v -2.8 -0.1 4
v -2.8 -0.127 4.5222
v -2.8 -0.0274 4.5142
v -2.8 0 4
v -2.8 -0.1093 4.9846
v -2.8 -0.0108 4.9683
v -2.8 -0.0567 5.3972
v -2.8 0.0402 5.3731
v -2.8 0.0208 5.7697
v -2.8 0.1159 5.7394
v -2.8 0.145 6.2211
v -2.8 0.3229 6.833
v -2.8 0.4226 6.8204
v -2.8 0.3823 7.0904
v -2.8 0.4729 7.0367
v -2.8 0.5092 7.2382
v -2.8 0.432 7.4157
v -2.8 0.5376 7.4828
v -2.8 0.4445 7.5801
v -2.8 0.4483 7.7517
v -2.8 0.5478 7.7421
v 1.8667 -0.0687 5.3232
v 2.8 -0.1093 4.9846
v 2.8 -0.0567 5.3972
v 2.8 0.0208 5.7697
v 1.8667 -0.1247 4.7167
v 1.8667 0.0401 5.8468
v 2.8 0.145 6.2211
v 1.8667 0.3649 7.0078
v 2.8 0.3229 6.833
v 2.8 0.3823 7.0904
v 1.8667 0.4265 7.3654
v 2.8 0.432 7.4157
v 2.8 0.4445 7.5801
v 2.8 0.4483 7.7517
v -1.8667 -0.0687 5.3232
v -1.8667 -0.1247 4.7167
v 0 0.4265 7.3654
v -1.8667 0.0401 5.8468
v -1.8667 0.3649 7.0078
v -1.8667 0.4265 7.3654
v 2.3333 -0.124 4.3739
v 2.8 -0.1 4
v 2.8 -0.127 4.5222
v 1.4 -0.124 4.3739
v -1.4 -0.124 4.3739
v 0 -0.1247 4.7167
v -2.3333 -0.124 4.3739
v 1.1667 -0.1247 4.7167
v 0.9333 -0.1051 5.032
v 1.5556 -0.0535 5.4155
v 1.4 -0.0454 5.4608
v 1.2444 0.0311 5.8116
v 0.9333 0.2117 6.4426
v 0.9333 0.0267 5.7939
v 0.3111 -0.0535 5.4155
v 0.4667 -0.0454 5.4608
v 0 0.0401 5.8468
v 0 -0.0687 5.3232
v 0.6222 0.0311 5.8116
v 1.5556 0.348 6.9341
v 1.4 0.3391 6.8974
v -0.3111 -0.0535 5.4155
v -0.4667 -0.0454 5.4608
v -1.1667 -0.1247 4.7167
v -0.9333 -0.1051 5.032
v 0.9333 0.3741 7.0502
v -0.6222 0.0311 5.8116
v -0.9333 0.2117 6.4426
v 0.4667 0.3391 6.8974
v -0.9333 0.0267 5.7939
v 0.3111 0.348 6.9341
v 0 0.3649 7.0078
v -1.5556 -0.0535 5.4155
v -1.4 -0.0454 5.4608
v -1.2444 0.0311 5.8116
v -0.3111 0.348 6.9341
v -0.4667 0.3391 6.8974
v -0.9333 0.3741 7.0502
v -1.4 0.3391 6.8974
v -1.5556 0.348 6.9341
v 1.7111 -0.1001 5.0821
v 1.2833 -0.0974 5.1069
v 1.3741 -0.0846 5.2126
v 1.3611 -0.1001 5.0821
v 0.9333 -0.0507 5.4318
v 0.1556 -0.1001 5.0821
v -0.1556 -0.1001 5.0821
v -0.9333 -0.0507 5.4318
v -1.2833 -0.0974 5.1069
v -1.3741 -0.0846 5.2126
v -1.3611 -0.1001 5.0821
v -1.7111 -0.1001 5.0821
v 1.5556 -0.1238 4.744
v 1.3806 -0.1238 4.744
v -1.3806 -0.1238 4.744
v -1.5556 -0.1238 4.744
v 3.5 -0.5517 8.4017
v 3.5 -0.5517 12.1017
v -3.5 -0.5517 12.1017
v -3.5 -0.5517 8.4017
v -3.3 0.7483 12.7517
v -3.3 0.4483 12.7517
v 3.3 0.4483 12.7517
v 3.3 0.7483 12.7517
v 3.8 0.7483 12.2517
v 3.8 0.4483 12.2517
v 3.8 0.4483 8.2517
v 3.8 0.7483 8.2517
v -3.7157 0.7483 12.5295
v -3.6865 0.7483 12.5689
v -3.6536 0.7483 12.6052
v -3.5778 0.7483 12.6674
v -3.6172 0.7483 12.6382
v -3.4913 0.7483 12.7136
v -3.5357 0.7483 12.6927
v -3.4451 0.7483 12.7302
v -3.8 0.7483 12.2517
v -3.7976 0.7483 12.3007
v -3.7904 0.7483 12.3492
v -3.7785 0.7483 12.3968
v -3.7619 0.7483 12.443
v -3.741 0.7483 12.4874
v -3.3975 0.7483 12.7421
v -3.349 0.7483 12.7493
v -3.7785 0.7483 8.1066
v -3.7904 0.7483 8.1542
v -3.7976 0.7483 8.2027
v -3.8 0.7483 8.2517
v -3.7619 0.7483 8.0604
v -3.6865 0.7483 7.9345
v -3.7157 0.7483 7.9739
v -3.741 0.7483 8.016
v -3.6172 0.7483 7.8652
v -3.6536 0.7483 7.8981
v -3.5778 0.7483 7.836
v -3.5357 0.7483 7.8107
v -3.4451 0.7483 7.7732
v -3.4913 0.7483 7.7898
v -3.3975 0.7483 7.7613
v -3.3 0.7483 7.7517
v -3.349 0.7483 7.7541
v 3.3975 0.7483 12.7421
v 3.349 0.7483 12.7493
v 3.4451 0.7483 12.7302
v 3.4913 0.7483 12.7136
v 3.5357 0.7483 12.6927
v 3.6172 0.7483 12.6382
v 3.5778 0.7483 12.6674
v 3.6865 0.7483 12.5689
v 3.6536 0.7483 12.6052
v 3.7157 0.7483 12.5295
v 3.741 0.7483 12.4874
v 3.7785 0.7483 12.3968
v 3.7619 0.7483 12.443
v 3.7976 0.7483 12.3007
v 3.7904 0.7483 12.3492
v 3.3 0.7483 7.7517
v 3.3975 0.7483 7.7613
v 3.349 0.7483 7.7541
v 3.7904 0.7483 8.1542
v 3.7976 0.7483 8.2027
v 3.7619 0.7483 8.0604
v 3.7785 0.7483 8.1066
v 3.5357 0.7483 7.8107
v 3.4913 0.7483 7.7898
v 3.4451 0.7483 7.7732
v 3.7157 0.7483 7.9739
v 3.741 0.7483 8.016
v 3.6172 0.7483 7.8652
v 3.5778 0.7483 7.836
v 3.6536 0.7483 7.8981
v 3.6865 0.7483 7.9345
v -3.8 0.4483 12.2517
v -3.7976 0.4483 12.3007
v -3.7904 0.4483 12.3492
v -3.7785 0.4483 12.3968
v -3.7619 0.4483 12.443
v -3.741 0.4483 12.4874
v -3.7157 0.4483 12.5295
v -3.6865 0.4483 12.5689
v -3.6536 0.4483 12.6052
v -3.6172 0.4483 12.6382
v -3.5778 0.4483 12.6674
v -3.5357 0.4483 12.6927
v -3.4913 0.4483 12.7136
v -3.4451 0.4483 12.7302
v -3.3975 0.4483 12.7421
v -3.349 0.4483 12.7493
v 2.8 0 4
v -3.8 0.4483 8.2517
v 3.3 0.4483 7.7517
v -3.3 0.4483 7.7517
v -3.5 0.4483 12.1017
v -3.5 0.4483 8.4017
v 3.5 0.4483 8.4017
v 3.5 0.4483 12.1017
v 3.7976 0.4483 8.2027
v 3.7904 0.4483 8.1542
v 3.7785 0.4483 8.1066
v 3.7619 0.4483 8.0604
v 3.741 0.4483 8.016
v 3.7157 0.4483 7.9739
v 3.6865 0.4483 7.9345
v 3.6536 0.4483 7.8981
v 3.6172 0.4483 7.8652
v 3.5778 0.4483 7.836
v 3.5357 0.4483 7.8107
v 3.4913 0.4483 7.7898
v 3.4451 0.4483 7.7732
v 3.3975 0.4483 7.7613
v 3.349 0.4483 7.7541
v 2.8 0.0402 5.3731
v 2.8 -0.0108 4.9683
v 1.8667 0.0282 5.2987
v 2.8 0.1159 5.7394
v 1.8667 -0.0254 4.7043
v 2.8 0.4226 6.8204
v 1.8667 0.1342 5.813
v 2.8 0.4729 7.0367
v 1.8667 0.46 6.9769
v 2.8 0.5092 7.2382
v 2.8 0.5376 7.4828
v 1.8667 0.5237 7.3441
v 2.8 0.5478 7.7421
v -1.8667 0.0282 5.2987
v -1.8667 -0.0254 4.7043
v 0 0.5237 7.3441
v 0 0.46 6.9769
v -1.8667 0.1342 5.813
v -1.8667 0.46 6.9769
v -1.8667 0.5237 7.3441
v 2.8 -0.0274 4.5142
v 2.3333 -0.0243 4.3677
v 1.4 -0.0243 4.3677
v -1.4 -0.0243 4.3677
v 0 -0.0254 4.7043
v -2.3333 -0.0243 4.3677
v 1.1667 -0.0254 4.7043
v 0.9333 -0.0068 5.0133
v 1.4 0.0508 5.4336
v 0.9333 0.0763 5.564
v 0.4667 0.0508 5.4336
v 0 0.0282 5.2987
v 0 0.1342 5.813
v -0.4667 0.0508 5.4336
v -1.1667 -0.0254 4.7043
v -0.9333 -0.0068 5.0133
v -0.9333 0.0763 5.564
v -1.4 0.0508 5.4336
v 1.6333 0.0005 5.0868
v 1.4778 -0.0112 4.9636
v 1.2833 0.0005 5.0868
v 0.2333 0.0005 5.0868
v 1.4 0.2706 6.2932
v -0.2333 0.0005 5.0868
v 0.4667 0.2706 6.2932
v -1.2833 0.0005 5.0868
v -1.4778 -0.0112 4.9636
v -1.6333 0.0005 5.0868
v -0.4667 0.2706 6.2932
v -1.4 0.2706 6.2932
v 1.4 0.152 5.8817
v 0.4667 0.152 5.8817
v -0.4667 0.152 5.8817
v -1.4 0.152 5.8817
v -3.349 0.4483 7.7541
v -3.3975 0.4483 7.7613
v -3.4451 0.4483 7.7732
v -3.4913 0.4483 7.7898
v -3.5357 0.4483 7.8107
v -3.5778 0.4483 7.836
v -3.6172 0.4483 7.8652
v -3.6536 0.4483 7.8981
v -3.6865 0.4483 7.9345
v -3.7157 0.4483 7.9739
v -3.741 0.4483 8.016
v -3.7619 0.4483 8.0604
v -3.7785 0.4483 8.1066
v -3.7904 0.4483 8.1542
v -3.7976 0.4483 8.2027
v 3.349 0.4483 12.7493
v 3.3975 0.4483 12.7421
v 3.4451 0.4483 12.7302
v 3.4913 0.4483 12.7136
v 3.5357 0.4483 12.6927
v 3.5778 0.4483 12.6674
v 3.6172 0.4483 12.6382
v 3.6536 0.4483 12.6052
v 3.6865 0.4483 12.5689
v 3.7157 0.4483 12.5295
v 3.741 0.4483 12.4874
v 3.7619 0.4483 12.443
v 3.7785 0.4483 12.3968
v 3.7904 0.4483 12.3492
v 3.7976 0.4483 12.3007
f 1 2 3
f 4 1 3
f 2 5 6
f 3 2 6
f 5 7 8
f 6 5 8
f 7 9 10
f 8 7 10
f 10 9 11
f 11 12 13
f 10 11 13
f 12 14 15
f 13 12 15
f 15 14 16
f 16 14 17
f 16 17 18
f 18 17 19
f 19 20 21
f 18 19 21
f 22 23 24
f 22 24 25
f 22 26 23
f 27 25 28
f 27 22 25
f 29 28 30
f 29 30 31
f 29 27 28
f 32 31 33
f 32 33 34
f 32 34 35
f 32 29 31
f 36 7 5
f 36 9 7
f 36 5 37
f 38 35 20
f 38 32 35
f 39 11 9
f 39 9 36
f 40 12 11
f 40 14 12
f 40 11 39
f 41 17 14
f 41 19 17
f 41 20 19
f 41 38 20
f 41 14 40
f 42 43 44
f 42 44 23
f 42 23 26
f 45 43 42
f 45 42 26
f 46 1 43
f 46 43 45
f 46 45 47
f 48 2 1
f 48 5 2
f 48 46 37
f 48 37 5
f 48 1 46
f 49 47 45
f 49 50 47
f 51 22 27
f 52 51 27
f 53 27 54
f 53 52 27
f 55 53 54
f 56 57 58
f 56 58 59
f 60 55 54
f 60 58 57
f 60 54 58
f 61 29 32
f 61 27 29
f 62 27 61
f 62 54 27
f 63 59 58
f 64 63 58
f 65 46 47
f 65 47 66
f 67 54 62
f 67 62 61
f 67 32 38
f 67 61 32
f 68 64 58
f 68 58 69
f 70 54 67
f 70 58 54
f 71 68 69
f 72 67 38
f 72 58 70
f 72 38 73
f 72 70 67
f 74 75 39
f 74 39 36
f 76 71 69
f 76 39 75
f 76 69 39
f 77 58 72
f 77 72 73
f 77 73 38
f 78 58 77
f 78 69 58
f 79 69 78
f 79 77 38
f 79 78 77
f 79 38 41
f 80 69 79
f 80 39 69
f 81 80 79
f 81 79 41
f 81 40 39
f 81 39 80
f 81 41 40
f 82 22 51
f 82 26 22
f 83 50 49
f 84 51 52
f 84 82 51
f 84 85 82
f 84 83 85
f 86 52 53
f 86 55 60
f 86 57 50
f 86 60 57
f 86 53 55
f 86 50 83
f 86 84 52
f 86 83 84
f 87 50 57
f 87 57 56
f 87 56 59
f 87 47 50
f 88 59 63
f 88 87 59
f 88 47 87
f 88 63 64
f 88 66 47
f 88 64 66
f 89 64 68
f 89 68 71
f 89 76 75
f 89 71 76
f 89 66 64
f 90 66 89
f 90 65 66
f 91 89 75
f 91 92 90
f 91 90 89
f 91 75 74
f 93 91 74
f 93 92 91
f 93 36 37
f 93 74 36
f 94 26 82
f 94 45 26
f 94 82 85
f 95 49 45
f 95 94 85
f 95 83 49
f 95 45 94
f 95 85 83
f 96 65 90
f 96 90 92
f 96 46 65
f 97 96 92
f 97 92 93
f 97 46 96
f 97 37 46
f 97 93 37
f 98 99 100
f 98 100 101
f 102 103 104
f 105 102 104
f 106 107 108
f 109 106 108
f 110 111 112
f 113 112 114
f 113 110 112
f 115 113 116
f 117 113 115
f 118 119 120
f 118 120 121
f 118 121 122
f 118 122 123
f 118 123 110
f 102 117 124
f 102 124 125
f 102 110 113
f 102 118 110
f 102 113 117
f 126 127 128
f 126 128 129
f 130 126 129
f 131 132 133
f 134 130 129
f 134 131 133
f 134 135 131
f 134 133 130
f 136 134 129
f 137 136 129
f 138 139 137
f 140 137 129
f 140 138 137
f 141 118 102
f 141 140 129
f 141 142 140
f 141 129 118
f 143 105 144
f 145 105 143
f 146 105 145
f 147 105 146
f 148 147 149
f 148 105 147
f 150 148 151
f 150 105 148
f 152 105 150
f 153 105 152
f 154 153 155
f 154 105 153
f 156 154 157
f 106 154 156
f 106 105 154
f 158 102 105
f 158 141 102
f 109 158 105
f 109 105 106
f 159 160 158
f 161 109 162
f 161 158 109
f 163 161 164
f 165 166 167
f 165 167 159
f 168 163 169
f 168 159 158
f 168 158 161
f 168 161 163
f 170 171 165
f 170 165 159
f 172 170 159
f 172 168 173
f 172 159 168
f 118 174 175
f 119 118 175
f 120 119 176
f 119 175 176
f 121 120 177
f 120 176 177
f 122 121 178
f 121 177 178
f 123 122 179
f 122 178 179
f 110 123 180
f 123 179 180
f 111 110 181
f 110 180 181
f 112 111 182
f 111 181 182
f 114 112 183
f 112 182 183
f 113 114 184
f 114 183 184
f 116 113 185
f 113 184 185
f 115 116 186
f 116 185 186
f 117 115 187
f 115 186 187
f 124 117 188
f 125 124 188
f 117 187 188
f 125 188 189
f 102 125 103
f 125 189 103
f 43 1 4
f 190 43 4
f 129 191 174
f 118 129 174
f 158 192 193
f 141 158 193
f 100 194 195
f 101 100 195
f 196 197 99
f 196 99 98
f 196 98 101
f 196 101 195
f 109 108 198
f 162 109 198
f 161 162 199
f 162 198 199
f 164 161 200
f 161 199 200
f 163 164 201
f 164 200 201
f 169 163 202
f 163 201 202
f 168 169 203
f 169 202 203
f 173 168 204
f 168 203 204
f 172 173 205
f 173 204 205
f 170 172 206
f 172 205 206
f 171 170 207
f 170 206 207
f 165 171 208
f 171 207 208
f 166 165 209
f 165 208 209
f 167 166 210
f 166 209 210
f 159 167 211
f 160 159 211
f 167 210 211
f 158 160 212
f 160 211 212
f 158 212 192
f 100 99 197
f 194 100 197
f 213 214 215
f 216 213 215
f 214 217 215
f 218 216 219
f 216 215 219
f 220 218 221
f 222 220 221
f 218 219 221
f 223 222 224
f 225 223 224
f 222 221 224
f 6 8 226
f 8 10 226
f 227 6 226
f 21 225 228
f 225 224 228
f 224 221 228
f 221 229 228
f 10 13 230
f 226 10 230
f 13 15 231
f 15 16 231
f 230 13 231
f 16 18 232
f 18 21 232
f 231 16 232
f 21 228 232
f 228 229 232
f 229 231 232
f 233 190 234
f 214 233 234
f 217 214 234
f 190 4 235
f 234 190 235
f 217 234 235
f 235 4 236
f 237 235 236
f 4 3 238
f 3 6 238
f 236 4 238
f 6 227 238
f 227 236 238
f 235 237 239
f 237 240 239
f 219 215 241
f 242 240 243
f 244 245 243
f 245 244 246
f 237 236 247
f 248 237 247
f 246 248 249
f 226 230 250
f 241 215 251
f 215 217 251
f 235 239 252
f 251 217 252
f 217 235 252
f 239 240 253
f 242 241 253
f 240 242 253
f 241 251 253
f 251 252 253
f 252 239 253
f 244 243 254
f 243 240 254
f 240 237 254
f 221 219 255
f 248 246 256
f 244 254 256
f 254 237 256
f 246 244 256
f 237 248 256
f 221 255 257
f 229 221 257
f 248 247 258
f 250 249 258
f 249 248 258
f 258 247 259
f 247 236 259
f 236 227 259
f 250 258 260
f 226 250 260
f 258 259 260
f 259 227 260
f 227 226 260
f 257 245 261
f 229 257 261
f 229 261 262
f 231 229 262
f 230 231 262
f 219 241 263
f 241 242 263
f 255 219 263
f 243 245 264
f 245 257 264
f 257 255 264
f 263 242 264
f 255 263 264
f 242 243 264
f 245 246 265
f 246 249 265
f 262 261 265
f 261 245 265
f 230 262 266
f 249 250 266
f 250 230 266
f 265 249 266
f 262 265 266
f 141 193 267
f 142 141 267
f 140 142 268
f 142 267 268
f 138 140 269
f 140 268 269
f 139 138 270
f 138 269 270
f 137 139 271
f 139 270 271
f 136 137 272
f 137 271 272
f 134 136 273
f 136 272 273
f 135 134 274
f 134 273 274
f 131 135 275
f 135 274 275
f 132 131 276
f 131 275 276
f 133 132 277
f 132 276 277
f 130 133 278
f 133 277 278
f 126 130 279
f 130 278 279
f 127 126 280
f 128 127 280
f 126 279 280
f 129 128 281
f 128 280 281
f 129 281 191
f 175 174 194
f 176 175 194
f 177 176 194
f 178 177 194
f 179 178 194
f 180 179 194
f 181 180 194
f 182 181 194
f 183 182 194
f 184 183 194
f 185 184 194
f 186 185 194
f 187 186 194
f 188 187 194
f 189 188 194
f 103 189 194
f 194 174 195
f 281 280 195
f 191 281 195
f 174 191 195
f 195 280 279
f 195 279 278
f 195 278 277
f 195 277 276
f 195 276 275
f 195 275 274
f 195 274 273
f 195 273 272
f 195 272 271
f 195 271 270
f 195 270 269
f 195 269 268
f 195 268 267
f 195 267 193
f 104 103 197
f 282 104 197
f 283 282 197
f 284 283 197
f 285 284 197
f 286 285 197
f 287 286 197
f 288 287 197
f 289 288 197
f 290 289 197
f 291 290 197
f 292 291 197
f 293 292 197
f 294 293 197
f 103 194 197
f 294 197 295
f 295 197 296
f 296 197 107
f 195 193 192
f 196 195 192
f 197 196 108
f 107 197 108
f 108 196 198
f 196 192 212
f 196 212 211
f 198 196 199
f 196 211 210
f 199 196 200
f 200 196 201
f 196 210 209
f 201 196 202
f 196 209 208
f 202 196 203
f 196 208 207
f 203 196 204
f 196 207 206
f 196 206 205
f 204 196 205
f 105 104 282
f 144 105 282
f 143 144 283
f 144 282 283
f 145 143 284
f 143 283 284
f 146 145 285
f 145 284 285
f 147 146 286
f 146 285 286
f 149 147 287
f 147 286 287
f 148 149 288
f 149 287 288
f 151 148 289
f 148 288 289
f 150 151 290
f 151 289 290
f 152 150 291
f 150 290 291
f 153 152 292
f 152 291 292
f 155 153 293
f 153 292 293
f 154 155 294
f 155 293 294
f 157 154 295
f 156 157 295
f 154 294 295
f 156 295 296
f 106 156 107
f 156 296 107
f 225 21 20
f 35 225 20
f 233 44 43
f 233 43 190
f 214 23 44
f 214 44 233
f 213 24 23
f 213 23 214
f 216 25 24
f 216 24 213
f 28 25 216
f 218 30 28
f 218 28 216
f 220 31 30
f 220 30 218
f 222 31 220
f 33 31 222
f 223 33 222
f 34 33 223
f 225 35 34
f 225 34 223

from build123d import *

# Parameters (mm, degrees)
F_3_8MM_FREE_LENGTH_START    = -2.8
F_3_8MM_FREE_LENGTH_DEPTH    = 5.6
PCB_DEPTH                    = 0.3
SKIZZE7_W                    = 3.7
SKIZZE7_H                    = 1
CONNECTOR_BOUNDARY_BOX_DEPTH = 3.5


# Read off the part's stored shape, not the designer's step: 3,8mm_free_Length
with BuildPart() as part:
    # 3,8mm_free_Length outline → 3,8mm_free_Length (new body)
    with BuildSketch(Plane.YZ.offset(F_3_8MM_FREE_LENGTH_START)):
        with BuildLine():
            add(Edge.make_bspline(
                [(0, 4), (-0.024628468, 4.256388466), (-0.038618016, 4.72259081), (0.01947153, 5.312011185), (0.129906645, 5.821389043), (0.291873769, 6.368027096), (0.477782991, 6.965975593), (0.547843022, 7.463268805), (0.547843022, 7.742133946)],
                knots=[0, 0, 0, 0, 0.14, 0.28, 0.42, 0.56, 0.78, 1, 1, 1, 1], degree=3))
            Line((0.547843022, 7.742133946), (0.448301222, 7.75169585))
            add(Edge.make_bspline(
                [(-0.1, 4), (-0.124487823, 4.260512861), (-0.138196079, 4.734963994), (-0.077568446, 5.337055167), (0.035994262, 5.856090972), (0.200282397, 6.407901627), (0.382793216, 6.999767267), (0.449818564, 7.4809073), (0.448301222, 7.75169585)],
                knots=[0, 0, 0, 0, 0.14, 0.28, 0.42, 0.56, 0.78, 1, 1, 1, 1], degree=3))
            Line((-0.1, 4), (0, 4))
        make_face()
    extrude(amount=F_3_8MM_FREE_LENGTH_DEPTH)


with BuildPart() as body_2:
    # Skizze6 → PCB (new body)
    with BuildSketch(Plane(origin=(0, 0.448301222, 0), x_dir=(-1, 0, 0), z_dir=(0, -1, 0))):
        with BuildLine():
            Line((3.3, -12.75169585), (-3.3, -12.75169585))
            ThreePointArc((-3.3, -12.75169585), (-3.653553391, -12.605249241), (-3.8, -12.25169585))
            Line((-3.8, -12.25169585), (-3.8, -8.25169585))
            ThreePointArc((-3.8, -8.25169585), (-3.653553391, -7.89814246), (-3.3, -7.75169585))
            Line((-3.3, -7.75169585), (3.3, -7.75169585))
            ThreePointArc((3.3, -7.75169585), (3.653553391, -7.89814246), (3.8, -8.25169585))
            Line((3.8, -8.25169585), (3.8, -12.25169585))
            ThreePointArc((3.8, -12.25169585), (3.653553391, -12.605249241), (3.3, -12.75169585))
        make_face()
    extrude(amount=-PCB_DEPTH)

    # Skizze7 → Connector_Boundary-Box (add, symmetric)
    with BuildSketch(Plane(origin=(0, 0, 0), x_dir=(0, 0, -1), z_dir=(1, 0, 0))):
        with Locations((-10.25169585, -0.051698778)):
            Rectangle(SKIZZE7_W, SKIZZE7_H)
    extrude(amount=CONNECTOR_BOUNDARY_BOX_DEPTH, both=True)


solid = Compound([part.part, body_2.part])
